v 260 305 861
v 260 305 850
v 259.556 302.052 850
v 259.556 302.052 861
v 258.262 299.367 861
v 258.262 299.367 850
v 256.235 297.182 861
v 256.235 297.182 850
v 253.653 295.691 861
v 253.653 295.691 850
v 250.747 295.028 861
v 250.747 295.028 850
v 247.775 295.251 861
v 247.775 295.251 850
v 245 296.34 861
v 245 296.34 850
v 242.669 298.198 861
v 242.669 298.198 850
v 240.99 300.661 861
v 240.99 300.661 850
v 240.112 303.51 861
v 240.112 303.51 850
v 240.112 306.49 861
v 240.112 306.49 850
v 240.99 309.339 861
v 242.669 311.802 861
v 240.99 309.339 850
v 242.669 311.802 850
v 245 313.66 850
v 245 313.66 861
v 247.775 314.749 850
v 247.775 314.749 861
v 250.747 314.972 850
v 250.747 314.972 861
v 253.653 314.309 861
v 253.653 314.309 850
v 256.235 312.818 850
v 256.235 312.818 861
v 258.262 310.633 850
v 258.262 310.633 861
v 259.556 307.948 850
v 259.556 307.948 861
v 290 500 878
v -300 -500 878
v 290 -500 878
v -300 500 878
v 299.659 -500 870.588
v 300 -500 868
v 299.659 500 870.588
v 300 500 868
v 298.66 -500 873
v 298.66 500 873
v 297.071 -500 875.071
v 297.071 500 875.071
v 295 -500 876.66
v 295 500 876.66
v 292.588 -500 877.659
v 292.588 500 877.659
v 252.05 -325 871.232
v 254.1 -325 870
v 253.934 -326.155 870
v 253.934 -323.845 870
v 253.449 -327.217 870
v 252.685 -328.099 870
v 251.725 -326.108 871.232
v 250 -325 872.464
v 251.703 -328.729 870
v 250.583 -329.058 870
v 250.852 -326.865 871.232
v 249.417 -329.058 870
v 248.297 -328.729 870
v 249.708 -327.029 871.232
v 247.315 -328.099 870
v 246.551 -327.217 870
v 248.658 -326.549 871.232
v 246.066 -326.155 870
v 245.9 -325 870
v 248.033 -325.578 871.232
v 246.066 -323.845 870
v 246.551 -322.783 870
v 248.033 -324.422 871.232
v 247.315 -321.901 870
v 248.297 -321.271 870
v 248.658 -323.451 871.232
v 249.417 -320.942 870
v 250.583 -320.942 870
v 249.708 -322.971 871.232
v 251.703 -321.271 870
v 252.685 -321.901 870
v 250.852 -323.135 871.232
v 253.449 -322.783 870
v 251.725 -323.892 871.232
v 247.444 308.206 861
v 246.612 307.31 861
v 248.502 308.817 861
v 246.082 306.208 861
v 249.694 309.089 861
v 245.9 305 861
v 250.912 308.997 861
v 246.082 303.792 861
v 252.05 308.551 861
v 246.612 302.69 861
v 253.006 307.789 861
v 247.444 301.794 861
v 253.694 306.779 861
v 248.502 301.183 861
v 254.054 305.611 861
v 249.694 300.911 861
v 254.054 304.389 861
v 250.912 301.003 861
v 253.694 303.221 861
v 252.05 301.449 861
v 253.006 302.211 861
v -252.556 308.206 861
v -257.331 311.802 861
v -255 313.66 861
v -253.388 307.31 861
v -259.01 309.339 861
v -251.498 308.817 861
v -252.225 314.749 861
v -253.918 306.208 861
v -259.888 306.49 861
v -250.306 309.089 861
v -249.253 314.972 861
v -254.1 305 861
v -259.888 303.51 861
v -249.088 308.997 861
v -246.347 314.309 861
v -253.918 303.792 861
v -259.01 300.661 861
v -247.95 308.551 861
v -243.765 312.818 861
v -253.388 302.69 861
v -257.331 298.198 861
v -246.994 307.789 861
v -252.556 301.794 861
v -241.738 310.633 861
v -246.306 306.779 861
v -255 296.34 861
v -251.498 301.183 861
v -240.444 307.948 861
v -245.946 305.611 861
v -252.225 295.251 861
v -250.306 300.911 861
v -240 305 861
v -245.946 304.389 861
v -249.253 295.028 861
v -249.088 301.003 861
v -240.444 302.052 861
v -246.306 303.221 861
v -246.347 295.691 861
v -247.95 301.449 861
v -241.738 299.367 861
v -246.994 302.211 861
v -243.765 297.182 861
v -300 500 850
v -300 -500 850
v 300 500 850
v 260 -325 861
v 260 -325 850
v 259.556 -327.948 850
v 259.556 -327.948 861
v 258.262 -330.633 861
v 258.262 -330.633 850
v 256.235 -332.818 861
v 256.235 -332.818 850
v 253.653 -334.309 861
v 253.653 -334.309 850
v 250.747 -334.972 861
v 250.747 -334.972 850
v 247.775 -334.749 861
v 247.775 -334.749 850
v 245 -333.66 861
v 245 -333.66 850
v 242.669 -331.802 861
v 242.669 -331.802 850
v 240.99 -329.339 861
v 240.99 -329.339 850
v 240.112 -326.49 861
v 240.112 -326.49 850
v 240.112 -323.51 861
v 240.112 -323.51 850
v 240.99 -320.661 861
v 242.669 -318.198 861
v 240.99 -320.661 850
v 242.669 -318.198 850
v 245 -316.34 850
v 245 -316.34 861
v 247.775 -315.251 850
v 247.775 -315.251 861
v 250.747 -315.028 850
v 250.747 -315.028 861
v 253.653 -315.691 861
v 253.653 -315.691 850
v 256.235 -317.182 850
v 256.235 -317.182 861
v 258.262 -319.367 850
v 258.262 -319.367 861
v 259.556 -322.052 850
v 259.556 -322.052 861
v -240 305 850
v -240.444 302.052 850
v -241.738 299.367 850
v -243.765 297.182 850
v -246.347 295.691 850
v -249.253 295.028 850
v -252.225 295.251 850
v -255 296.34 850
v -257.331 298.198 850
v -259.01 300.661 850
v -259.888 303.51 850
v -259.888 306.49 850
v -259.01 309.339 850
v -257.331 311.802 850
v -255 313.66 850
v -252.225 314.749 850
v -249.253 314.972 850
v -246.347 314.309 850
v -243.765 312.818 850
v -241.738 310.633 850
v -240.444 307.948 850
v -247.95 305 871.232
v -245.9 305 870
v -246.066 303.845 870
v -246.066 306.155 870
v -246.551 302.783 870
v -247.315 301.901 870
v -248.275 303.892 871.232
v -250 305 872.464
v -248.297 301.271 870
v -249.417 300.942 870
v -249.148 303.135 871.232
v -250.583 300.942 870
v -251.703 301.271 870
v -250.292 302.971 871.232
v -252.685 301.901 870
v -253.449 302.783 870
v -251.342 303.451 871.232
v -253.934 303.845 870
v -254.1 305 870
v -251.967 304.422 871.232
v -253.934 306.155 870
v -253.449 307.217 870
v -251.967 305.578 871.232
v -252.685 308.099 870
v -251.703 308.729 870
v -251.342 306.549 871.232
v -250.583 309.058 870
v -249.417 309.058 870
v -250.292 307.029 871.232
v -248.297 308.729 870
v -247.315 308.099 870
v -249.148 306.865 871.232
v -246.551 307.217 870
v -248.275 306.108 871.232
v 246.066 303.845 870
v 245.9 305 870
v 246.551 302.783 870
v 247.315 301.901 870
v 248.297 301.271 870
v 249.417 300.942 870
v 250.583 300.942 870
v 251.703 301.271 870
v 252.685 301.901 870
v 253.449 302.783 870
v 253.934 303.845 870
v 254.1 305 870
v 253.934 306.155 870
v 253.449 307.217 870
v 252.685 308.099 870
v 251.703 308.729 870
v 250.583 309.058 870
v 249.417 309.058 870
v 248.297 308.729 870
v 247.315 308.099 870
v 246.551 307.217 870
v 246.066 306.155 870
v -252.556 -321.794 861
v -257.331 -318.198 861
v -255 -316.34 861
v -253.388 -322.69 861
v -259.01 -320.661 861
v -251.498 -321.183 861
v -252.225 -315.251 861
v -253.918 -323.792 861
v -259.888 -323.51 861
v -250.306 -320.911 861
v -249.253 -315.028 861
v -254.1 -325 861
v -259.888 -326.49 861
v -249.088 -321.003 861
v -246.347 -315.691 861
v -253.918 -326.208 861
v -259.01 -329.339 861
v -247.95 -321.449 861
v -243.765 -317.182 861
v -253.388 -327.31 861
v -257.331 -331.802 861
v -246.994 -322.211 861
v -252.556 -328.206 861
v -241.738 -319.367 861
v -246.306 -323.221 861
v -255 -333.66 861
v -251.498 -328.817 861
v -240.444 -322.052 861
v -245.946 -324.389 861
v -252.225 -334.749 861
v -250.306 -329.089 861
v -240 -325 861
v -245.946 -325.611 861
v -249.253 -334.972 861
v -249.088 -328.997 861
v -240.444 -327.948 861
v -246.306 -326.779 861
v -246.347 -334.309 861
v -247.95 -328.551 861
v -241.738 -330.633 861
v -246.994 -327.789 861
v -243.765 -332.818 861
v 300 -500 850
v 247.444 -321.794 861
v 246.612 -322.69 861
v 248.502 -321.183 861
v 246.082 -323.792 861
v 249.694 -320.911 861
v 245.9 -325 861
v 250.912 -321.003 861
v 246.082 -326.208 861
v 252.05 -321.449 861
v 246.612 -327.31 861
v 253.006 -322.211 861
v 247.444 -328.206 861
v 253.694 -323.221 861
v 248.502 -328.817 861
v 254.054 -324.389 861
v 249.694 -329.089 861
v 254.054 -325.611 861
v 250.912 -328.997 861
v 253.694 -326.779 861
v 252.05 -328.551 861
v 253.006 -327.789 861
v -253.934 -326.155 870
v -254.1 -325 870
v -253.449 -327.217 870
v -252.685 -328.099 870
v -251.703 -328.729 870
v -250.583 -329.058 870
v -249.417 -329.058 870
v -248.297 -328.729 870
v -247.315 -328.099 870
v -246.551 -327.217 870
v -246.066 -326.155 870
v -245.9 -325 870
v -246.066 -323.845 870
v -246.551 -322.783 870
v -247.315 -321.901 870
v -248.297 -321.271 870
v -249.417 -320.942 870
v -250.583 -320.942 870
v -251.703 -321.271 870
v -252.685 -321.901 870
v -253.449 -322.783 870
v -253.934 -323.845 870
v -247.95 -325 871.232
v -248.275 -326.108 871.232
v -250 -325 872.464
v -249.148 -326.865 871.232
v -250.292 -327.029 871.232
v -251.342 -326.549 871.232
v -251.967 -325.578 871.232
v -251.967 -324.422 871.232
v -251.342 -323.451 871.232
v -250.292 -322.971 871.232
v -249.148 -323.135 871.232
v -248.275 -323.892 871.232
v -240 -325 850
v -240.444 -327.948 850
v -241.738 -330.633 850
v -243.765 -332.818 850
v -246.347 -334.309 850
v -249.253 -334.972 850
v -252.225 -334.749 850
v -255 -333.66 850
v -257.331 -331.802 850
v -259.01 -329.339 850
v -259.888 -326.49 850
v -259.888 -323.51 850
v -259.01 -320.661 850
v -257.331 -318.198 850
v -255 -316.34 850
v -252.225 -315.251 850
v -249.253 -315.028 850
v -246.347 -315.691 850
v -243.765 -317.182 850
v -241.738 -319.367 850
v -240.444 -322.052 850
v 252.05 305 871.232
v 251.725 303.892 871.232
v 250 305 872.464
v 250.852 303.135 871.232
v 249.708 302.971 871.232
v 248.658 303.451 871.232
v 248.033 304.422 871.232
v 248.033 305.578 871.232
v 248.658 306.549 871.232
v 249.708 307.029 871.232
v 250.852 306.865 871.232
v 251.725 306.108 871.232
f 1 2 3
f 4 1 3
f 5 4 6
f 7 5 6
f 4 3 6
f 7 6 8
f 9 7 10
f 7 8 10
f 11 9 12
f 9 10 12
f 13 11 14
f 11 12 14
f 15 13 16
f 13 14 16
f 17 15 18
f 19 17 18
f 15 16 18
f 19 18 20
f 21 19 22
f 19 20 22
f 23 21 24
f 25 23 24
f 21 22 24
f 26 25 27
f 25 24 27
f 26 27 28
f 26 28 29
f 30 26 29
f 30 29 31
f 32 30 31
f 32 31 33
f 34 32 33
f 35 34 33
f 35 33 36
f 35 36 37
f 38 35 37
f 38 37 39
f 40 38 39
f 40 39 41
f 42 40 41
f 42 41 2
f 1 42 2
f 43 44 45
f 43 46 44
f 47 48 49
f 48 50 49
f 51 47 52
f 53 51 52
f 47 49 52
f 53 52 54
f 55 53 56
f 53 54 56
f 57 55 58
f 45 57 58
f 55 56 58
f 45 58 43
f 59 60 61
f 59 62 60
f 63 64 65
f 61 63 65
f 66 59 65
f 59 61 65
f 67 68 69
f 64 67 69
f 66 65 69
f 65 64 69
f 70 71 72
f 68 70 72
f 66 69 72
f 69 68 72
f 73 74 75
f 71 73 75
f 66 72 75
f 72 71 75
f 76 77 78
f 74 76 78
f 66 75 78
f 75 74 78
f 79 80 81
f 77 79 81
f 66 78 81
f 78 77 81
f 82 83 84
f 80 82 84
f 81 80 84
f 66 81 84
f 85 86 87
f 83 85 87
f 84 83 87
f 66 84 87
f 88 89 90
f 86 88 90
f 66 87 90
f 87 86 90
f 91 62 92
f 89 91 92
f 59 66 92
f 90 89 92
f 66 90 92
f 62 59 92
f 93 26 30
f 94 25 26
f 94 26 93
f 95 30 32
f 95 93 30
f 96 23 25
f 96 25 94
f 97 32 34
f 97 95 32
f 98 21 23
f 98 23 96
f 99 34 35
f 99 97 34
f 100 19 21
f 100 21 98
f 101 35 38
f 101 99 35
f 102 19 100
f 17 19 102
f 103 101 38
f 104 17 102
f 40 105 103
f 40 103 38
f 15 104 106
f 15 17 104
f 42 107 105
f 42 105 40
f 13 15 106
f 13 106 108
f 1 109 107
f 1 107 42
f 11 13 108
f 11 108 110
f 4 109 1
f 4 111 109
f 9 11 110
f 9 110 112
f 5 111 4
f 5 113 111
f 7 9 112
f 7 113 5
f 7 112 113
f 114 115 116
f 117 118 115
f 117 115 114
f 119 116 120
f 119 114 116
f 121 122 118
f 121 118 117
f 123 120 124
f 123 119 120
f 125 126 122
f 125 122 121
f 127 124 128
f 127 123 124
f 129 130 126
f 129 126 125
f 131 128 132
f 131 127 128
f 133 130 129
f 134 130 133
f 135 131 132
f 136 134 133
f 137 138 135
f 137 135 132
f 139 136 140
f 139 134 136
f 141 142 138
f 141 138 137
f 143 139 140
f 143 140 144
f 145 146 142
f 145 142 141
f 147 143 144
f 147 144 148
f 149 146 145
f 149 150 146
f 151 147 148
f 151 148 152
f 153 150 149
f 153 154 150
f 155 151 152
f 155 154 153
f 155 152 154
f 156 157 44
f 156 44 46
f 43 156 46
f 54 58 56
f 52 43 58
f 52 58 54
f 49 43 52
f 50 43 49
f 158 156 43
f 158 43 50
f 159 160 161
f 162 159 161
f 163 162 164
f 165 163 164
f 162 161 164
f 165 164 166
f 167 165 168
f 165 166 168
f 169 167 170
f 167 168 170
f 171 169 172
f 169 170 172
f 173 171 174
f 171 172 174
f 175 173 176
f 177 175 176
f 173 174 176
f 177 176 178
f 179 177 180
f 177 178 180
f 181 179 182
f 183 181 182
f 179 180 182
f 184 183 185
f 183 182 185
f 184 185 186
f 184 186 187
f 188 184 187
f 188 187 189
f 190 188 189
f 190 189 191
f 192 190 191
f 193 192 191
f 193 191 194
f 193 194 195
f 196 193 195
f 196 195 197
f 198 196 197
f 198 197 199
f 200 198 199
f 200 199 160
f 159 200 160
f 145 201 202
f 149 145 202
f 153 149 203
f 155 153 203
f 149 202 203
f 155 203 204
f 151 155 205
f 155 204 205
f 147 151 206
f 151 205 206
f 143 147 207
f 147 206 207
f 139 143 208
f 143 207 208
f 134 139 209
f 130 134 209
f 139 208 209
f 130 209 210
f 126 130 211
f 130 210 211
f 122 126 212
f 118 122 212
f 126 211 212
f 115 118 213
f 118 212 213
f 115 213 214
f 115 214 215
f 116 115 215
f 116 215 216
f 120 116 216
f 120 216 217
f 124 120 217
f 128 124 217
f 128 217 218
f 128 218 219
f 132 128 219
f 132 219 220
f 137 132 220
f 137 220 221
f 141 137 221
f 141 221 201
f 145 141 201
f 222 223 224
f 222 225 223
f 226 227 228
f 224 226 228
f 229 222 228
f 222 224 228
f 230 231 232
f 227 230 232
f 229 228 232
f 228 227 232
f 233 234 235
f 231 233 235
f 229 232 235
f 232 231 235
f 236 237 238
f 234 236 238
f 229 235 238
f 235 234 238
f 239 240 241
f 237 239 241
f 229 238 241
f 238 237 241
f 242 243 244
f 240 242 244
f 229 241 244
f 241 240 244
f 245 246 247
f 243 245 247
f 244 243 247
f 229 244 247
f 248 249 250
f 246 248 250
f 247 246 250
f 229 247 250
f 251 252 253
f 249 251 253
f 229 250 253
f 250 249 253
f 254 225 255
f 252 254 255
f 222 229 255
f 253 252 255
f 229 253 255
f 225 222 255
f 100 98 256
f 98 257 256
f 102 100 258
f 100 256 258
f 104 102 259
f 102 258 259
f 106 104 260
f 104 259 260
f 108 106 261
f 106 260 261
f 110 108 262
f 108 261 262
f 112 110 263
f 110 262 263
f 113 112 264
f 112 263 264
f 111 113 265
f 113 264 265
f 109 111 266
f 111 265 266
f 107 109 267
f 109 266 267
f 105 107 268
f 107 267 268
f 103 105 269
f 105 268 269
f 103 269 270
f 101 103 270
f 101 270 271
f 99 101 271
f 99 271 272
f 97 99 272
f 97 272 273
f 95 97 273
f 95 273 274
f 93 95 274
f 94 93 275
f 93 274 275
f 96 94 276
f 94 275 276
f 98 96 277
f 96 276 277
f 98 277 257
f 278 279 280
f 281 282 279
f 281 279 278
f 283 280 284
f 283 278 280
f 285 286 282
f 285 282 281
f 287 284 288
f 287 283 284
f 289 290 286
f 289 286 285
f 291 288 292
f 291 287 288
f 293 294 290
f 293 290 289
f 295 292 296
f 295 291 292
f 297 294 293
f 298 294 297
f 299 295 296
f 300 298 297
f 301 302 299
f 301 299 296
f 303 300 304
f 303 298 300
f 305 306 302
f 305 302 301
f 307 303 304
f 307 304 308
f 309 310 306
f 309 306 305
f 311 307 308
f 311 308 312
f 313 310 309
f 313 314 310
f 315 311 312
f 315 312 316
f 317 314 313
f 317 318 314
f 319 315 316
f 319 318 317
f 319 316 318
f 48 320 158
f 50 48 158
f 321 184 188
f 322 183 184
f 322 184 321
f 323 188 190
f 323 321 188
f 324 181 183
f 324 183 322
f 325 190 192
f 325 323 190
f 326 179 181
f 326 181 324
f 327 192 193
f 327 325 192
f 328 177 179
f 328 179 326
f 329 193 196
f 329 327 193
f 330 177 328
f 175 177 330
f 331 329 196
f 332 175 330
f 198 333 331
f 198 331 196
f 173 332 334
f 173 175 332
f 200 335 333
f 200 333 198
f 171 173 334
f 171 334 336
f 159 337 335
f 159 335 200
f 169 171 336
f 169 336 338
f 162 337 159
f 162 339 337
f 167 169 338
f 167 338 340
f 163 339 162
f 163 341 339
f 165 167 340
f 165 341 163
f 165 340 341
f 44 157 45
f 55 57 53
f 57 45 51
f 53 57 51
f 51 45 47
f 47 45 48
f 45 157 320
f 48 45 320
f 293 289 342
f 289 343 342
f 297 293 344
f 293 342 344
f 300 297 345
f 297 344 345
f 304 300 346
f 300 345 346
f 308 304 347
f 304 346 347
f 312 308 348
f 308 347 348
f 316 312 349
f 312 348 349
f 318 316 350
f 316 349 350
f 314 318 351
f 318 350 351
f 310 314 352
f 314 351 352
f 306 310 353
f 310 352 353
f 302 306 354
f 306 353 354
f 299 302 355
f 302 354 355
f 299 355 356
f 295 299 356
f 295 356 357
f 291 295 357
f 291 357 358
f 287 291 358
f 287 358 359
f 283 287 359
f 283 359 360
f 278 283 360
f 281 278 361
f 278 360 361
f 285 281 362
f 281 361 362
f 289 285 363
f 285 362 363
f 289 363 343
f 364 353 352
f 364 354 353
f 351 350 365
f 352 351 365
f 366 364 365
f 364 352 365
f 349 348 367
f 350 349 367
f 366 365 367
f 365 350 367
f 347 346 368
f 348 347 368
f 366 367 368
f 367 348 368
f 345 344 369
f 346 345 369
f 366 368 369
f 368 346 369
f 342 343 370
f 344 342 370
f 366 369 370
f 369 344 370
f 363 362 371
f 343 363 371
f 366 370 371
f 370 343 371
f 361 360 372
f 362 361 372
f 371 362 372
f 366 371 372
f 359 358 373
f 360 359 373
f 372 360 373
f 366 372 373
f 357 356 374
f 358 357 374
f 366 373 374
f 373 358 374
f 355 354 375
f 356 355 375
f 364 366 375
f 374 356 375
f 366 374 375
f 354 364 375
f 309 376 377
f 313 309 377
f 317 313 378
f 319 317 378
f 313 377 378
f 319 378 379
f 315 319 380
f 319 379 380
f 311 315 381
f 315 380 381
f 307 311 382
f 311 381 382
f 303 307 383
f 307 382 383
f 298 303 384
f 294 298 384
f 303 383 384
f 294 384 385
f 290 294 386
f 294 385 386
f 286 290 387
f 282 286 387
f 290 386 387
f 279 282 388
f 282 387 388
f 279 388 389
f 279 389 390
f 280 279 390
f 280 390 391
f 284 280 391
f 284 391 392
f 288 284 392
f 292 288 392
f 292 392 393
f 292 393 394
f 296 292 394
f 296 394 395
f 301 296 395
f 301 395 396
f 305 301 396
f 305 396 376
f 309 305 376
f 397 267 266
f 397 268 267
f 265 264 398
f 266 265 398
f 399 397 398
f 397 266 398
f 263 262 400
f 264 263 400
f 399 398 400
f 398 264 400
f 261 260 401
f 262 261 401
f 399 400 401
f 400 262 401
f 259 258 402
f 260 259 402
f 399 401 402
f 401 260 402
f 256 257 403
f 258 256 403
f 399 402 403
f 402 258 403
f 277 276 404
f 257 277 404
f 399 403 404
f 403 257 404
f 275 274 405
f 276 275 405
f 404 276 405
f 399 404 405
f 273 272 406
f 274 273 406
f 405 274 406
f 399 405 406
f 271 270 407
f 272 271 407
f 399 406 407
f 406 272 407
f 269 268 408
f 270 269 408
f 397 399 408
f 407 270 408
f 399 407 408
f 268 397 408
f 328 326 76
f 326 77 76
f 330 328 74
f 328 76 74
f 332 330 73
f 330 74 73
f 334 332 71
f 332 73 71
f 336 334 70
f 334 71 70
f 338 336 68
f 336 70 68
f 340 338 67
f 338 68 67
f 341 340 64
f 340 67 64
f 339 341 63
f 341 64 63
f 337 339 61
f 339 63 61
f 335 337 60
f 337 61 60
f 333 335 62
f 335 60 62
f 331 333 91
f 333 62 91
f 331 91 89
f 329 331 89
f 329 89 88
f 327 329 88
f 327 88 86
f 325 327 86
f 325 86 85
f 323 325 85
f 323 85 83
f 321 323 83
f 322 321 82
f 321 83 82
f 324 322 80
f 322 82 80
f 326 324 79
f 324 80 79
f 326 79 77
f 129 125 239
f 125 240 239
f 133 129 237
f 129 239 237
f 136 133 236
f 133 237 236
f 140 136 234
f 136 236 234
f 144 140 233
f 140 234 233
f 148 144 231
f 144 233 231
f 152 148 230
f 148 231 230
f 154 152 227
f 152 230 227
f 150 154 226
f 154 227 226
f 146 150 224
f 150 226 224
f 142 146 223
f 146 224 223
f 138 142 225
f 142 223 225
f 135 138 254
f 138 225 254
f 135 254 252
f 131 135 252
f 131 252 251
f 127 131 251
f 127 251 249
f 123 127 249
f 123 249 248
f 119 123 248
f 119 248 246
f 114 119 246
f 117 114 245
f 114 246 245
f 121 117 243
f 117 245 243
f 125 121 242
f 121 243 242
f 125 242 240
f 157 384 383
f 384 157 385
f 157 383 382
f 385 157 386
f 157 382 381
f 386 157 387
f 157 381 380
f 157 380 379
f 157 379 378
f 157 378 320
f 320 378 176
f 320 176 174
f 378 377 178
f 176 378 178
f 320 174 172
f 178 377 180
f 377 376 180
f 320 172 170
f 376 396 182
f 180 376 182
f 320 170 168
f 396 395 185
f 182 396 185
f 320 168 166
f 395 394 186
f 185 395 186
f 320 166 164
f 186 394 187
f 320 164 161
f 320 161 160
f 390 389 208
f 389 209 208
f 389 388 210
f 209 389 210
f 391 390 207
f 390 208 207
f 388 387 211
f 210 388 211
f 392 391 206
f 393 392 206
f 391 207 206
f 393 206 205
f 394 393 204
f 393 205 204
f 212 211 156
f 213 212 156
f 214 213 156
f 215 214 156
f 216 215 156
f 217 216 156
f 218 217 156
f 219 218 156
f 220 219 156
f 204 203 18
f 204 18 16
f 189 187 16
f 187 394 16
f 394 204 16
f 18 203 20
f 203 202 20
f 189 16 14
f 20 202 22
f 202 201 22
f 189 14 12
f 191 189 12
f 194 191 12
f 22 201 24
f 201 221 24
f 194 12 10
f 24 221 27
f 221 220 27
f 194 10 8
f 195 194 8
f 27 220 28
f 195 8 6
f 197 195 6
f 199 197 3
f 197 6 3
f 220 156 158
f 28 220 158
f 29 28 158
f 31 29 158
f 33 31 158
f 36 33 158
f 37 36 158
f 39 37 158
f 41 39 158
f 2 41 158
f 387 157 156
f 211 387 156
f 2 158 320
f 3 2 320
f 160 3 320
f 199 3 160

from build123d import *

# Parameters (mm, degrees)
F1_W           = 600
F1_H           = 1000
F2_DEPTH       = 28
F3_R           = 10
F5_D           = 8.2
F5_DEPTH       = 20
F5_CBORE_D     = 20
F5_CBORE_DEPTH = 11
F5_TIP         = 2.463528538


with BuildPart() as f2:
    # F1 (on offset) → F2 (new body)
    with BuildSketch(Plane.XY.offset(850)):
        Rectangle(F1_W, F1_H)
    extrude(amount=F2_DEPTH)

    # F3
    f3_edges = [f2.edges().sort_by_distance(p)[0] for p in [
        (300, 0, 878),
    ]]
    fillet(f3_edges, radius=F3_R)

    # F5
    with Locations(Plane(origin=(0, 0, 850), x_dir=(1, 0, 0), z_dir=(0, 0, -1))):
        with Locations((250, 325), (250, -305), (-250, -305), (-250, 325)):
            CounterBoreHole(F5_D / 2, F5_CBORE_D / 2, F5_CBORE_DEPTH, depth=F5_DEPTH)
            with Locations((0, 0, -(F5_DEPTH + F5_TIP / 2))):  # 118° drill point
                Cone(0, F5_D / 2, F5_TIP, mode=Mode.SUBTRACT)


solid = f2.part
